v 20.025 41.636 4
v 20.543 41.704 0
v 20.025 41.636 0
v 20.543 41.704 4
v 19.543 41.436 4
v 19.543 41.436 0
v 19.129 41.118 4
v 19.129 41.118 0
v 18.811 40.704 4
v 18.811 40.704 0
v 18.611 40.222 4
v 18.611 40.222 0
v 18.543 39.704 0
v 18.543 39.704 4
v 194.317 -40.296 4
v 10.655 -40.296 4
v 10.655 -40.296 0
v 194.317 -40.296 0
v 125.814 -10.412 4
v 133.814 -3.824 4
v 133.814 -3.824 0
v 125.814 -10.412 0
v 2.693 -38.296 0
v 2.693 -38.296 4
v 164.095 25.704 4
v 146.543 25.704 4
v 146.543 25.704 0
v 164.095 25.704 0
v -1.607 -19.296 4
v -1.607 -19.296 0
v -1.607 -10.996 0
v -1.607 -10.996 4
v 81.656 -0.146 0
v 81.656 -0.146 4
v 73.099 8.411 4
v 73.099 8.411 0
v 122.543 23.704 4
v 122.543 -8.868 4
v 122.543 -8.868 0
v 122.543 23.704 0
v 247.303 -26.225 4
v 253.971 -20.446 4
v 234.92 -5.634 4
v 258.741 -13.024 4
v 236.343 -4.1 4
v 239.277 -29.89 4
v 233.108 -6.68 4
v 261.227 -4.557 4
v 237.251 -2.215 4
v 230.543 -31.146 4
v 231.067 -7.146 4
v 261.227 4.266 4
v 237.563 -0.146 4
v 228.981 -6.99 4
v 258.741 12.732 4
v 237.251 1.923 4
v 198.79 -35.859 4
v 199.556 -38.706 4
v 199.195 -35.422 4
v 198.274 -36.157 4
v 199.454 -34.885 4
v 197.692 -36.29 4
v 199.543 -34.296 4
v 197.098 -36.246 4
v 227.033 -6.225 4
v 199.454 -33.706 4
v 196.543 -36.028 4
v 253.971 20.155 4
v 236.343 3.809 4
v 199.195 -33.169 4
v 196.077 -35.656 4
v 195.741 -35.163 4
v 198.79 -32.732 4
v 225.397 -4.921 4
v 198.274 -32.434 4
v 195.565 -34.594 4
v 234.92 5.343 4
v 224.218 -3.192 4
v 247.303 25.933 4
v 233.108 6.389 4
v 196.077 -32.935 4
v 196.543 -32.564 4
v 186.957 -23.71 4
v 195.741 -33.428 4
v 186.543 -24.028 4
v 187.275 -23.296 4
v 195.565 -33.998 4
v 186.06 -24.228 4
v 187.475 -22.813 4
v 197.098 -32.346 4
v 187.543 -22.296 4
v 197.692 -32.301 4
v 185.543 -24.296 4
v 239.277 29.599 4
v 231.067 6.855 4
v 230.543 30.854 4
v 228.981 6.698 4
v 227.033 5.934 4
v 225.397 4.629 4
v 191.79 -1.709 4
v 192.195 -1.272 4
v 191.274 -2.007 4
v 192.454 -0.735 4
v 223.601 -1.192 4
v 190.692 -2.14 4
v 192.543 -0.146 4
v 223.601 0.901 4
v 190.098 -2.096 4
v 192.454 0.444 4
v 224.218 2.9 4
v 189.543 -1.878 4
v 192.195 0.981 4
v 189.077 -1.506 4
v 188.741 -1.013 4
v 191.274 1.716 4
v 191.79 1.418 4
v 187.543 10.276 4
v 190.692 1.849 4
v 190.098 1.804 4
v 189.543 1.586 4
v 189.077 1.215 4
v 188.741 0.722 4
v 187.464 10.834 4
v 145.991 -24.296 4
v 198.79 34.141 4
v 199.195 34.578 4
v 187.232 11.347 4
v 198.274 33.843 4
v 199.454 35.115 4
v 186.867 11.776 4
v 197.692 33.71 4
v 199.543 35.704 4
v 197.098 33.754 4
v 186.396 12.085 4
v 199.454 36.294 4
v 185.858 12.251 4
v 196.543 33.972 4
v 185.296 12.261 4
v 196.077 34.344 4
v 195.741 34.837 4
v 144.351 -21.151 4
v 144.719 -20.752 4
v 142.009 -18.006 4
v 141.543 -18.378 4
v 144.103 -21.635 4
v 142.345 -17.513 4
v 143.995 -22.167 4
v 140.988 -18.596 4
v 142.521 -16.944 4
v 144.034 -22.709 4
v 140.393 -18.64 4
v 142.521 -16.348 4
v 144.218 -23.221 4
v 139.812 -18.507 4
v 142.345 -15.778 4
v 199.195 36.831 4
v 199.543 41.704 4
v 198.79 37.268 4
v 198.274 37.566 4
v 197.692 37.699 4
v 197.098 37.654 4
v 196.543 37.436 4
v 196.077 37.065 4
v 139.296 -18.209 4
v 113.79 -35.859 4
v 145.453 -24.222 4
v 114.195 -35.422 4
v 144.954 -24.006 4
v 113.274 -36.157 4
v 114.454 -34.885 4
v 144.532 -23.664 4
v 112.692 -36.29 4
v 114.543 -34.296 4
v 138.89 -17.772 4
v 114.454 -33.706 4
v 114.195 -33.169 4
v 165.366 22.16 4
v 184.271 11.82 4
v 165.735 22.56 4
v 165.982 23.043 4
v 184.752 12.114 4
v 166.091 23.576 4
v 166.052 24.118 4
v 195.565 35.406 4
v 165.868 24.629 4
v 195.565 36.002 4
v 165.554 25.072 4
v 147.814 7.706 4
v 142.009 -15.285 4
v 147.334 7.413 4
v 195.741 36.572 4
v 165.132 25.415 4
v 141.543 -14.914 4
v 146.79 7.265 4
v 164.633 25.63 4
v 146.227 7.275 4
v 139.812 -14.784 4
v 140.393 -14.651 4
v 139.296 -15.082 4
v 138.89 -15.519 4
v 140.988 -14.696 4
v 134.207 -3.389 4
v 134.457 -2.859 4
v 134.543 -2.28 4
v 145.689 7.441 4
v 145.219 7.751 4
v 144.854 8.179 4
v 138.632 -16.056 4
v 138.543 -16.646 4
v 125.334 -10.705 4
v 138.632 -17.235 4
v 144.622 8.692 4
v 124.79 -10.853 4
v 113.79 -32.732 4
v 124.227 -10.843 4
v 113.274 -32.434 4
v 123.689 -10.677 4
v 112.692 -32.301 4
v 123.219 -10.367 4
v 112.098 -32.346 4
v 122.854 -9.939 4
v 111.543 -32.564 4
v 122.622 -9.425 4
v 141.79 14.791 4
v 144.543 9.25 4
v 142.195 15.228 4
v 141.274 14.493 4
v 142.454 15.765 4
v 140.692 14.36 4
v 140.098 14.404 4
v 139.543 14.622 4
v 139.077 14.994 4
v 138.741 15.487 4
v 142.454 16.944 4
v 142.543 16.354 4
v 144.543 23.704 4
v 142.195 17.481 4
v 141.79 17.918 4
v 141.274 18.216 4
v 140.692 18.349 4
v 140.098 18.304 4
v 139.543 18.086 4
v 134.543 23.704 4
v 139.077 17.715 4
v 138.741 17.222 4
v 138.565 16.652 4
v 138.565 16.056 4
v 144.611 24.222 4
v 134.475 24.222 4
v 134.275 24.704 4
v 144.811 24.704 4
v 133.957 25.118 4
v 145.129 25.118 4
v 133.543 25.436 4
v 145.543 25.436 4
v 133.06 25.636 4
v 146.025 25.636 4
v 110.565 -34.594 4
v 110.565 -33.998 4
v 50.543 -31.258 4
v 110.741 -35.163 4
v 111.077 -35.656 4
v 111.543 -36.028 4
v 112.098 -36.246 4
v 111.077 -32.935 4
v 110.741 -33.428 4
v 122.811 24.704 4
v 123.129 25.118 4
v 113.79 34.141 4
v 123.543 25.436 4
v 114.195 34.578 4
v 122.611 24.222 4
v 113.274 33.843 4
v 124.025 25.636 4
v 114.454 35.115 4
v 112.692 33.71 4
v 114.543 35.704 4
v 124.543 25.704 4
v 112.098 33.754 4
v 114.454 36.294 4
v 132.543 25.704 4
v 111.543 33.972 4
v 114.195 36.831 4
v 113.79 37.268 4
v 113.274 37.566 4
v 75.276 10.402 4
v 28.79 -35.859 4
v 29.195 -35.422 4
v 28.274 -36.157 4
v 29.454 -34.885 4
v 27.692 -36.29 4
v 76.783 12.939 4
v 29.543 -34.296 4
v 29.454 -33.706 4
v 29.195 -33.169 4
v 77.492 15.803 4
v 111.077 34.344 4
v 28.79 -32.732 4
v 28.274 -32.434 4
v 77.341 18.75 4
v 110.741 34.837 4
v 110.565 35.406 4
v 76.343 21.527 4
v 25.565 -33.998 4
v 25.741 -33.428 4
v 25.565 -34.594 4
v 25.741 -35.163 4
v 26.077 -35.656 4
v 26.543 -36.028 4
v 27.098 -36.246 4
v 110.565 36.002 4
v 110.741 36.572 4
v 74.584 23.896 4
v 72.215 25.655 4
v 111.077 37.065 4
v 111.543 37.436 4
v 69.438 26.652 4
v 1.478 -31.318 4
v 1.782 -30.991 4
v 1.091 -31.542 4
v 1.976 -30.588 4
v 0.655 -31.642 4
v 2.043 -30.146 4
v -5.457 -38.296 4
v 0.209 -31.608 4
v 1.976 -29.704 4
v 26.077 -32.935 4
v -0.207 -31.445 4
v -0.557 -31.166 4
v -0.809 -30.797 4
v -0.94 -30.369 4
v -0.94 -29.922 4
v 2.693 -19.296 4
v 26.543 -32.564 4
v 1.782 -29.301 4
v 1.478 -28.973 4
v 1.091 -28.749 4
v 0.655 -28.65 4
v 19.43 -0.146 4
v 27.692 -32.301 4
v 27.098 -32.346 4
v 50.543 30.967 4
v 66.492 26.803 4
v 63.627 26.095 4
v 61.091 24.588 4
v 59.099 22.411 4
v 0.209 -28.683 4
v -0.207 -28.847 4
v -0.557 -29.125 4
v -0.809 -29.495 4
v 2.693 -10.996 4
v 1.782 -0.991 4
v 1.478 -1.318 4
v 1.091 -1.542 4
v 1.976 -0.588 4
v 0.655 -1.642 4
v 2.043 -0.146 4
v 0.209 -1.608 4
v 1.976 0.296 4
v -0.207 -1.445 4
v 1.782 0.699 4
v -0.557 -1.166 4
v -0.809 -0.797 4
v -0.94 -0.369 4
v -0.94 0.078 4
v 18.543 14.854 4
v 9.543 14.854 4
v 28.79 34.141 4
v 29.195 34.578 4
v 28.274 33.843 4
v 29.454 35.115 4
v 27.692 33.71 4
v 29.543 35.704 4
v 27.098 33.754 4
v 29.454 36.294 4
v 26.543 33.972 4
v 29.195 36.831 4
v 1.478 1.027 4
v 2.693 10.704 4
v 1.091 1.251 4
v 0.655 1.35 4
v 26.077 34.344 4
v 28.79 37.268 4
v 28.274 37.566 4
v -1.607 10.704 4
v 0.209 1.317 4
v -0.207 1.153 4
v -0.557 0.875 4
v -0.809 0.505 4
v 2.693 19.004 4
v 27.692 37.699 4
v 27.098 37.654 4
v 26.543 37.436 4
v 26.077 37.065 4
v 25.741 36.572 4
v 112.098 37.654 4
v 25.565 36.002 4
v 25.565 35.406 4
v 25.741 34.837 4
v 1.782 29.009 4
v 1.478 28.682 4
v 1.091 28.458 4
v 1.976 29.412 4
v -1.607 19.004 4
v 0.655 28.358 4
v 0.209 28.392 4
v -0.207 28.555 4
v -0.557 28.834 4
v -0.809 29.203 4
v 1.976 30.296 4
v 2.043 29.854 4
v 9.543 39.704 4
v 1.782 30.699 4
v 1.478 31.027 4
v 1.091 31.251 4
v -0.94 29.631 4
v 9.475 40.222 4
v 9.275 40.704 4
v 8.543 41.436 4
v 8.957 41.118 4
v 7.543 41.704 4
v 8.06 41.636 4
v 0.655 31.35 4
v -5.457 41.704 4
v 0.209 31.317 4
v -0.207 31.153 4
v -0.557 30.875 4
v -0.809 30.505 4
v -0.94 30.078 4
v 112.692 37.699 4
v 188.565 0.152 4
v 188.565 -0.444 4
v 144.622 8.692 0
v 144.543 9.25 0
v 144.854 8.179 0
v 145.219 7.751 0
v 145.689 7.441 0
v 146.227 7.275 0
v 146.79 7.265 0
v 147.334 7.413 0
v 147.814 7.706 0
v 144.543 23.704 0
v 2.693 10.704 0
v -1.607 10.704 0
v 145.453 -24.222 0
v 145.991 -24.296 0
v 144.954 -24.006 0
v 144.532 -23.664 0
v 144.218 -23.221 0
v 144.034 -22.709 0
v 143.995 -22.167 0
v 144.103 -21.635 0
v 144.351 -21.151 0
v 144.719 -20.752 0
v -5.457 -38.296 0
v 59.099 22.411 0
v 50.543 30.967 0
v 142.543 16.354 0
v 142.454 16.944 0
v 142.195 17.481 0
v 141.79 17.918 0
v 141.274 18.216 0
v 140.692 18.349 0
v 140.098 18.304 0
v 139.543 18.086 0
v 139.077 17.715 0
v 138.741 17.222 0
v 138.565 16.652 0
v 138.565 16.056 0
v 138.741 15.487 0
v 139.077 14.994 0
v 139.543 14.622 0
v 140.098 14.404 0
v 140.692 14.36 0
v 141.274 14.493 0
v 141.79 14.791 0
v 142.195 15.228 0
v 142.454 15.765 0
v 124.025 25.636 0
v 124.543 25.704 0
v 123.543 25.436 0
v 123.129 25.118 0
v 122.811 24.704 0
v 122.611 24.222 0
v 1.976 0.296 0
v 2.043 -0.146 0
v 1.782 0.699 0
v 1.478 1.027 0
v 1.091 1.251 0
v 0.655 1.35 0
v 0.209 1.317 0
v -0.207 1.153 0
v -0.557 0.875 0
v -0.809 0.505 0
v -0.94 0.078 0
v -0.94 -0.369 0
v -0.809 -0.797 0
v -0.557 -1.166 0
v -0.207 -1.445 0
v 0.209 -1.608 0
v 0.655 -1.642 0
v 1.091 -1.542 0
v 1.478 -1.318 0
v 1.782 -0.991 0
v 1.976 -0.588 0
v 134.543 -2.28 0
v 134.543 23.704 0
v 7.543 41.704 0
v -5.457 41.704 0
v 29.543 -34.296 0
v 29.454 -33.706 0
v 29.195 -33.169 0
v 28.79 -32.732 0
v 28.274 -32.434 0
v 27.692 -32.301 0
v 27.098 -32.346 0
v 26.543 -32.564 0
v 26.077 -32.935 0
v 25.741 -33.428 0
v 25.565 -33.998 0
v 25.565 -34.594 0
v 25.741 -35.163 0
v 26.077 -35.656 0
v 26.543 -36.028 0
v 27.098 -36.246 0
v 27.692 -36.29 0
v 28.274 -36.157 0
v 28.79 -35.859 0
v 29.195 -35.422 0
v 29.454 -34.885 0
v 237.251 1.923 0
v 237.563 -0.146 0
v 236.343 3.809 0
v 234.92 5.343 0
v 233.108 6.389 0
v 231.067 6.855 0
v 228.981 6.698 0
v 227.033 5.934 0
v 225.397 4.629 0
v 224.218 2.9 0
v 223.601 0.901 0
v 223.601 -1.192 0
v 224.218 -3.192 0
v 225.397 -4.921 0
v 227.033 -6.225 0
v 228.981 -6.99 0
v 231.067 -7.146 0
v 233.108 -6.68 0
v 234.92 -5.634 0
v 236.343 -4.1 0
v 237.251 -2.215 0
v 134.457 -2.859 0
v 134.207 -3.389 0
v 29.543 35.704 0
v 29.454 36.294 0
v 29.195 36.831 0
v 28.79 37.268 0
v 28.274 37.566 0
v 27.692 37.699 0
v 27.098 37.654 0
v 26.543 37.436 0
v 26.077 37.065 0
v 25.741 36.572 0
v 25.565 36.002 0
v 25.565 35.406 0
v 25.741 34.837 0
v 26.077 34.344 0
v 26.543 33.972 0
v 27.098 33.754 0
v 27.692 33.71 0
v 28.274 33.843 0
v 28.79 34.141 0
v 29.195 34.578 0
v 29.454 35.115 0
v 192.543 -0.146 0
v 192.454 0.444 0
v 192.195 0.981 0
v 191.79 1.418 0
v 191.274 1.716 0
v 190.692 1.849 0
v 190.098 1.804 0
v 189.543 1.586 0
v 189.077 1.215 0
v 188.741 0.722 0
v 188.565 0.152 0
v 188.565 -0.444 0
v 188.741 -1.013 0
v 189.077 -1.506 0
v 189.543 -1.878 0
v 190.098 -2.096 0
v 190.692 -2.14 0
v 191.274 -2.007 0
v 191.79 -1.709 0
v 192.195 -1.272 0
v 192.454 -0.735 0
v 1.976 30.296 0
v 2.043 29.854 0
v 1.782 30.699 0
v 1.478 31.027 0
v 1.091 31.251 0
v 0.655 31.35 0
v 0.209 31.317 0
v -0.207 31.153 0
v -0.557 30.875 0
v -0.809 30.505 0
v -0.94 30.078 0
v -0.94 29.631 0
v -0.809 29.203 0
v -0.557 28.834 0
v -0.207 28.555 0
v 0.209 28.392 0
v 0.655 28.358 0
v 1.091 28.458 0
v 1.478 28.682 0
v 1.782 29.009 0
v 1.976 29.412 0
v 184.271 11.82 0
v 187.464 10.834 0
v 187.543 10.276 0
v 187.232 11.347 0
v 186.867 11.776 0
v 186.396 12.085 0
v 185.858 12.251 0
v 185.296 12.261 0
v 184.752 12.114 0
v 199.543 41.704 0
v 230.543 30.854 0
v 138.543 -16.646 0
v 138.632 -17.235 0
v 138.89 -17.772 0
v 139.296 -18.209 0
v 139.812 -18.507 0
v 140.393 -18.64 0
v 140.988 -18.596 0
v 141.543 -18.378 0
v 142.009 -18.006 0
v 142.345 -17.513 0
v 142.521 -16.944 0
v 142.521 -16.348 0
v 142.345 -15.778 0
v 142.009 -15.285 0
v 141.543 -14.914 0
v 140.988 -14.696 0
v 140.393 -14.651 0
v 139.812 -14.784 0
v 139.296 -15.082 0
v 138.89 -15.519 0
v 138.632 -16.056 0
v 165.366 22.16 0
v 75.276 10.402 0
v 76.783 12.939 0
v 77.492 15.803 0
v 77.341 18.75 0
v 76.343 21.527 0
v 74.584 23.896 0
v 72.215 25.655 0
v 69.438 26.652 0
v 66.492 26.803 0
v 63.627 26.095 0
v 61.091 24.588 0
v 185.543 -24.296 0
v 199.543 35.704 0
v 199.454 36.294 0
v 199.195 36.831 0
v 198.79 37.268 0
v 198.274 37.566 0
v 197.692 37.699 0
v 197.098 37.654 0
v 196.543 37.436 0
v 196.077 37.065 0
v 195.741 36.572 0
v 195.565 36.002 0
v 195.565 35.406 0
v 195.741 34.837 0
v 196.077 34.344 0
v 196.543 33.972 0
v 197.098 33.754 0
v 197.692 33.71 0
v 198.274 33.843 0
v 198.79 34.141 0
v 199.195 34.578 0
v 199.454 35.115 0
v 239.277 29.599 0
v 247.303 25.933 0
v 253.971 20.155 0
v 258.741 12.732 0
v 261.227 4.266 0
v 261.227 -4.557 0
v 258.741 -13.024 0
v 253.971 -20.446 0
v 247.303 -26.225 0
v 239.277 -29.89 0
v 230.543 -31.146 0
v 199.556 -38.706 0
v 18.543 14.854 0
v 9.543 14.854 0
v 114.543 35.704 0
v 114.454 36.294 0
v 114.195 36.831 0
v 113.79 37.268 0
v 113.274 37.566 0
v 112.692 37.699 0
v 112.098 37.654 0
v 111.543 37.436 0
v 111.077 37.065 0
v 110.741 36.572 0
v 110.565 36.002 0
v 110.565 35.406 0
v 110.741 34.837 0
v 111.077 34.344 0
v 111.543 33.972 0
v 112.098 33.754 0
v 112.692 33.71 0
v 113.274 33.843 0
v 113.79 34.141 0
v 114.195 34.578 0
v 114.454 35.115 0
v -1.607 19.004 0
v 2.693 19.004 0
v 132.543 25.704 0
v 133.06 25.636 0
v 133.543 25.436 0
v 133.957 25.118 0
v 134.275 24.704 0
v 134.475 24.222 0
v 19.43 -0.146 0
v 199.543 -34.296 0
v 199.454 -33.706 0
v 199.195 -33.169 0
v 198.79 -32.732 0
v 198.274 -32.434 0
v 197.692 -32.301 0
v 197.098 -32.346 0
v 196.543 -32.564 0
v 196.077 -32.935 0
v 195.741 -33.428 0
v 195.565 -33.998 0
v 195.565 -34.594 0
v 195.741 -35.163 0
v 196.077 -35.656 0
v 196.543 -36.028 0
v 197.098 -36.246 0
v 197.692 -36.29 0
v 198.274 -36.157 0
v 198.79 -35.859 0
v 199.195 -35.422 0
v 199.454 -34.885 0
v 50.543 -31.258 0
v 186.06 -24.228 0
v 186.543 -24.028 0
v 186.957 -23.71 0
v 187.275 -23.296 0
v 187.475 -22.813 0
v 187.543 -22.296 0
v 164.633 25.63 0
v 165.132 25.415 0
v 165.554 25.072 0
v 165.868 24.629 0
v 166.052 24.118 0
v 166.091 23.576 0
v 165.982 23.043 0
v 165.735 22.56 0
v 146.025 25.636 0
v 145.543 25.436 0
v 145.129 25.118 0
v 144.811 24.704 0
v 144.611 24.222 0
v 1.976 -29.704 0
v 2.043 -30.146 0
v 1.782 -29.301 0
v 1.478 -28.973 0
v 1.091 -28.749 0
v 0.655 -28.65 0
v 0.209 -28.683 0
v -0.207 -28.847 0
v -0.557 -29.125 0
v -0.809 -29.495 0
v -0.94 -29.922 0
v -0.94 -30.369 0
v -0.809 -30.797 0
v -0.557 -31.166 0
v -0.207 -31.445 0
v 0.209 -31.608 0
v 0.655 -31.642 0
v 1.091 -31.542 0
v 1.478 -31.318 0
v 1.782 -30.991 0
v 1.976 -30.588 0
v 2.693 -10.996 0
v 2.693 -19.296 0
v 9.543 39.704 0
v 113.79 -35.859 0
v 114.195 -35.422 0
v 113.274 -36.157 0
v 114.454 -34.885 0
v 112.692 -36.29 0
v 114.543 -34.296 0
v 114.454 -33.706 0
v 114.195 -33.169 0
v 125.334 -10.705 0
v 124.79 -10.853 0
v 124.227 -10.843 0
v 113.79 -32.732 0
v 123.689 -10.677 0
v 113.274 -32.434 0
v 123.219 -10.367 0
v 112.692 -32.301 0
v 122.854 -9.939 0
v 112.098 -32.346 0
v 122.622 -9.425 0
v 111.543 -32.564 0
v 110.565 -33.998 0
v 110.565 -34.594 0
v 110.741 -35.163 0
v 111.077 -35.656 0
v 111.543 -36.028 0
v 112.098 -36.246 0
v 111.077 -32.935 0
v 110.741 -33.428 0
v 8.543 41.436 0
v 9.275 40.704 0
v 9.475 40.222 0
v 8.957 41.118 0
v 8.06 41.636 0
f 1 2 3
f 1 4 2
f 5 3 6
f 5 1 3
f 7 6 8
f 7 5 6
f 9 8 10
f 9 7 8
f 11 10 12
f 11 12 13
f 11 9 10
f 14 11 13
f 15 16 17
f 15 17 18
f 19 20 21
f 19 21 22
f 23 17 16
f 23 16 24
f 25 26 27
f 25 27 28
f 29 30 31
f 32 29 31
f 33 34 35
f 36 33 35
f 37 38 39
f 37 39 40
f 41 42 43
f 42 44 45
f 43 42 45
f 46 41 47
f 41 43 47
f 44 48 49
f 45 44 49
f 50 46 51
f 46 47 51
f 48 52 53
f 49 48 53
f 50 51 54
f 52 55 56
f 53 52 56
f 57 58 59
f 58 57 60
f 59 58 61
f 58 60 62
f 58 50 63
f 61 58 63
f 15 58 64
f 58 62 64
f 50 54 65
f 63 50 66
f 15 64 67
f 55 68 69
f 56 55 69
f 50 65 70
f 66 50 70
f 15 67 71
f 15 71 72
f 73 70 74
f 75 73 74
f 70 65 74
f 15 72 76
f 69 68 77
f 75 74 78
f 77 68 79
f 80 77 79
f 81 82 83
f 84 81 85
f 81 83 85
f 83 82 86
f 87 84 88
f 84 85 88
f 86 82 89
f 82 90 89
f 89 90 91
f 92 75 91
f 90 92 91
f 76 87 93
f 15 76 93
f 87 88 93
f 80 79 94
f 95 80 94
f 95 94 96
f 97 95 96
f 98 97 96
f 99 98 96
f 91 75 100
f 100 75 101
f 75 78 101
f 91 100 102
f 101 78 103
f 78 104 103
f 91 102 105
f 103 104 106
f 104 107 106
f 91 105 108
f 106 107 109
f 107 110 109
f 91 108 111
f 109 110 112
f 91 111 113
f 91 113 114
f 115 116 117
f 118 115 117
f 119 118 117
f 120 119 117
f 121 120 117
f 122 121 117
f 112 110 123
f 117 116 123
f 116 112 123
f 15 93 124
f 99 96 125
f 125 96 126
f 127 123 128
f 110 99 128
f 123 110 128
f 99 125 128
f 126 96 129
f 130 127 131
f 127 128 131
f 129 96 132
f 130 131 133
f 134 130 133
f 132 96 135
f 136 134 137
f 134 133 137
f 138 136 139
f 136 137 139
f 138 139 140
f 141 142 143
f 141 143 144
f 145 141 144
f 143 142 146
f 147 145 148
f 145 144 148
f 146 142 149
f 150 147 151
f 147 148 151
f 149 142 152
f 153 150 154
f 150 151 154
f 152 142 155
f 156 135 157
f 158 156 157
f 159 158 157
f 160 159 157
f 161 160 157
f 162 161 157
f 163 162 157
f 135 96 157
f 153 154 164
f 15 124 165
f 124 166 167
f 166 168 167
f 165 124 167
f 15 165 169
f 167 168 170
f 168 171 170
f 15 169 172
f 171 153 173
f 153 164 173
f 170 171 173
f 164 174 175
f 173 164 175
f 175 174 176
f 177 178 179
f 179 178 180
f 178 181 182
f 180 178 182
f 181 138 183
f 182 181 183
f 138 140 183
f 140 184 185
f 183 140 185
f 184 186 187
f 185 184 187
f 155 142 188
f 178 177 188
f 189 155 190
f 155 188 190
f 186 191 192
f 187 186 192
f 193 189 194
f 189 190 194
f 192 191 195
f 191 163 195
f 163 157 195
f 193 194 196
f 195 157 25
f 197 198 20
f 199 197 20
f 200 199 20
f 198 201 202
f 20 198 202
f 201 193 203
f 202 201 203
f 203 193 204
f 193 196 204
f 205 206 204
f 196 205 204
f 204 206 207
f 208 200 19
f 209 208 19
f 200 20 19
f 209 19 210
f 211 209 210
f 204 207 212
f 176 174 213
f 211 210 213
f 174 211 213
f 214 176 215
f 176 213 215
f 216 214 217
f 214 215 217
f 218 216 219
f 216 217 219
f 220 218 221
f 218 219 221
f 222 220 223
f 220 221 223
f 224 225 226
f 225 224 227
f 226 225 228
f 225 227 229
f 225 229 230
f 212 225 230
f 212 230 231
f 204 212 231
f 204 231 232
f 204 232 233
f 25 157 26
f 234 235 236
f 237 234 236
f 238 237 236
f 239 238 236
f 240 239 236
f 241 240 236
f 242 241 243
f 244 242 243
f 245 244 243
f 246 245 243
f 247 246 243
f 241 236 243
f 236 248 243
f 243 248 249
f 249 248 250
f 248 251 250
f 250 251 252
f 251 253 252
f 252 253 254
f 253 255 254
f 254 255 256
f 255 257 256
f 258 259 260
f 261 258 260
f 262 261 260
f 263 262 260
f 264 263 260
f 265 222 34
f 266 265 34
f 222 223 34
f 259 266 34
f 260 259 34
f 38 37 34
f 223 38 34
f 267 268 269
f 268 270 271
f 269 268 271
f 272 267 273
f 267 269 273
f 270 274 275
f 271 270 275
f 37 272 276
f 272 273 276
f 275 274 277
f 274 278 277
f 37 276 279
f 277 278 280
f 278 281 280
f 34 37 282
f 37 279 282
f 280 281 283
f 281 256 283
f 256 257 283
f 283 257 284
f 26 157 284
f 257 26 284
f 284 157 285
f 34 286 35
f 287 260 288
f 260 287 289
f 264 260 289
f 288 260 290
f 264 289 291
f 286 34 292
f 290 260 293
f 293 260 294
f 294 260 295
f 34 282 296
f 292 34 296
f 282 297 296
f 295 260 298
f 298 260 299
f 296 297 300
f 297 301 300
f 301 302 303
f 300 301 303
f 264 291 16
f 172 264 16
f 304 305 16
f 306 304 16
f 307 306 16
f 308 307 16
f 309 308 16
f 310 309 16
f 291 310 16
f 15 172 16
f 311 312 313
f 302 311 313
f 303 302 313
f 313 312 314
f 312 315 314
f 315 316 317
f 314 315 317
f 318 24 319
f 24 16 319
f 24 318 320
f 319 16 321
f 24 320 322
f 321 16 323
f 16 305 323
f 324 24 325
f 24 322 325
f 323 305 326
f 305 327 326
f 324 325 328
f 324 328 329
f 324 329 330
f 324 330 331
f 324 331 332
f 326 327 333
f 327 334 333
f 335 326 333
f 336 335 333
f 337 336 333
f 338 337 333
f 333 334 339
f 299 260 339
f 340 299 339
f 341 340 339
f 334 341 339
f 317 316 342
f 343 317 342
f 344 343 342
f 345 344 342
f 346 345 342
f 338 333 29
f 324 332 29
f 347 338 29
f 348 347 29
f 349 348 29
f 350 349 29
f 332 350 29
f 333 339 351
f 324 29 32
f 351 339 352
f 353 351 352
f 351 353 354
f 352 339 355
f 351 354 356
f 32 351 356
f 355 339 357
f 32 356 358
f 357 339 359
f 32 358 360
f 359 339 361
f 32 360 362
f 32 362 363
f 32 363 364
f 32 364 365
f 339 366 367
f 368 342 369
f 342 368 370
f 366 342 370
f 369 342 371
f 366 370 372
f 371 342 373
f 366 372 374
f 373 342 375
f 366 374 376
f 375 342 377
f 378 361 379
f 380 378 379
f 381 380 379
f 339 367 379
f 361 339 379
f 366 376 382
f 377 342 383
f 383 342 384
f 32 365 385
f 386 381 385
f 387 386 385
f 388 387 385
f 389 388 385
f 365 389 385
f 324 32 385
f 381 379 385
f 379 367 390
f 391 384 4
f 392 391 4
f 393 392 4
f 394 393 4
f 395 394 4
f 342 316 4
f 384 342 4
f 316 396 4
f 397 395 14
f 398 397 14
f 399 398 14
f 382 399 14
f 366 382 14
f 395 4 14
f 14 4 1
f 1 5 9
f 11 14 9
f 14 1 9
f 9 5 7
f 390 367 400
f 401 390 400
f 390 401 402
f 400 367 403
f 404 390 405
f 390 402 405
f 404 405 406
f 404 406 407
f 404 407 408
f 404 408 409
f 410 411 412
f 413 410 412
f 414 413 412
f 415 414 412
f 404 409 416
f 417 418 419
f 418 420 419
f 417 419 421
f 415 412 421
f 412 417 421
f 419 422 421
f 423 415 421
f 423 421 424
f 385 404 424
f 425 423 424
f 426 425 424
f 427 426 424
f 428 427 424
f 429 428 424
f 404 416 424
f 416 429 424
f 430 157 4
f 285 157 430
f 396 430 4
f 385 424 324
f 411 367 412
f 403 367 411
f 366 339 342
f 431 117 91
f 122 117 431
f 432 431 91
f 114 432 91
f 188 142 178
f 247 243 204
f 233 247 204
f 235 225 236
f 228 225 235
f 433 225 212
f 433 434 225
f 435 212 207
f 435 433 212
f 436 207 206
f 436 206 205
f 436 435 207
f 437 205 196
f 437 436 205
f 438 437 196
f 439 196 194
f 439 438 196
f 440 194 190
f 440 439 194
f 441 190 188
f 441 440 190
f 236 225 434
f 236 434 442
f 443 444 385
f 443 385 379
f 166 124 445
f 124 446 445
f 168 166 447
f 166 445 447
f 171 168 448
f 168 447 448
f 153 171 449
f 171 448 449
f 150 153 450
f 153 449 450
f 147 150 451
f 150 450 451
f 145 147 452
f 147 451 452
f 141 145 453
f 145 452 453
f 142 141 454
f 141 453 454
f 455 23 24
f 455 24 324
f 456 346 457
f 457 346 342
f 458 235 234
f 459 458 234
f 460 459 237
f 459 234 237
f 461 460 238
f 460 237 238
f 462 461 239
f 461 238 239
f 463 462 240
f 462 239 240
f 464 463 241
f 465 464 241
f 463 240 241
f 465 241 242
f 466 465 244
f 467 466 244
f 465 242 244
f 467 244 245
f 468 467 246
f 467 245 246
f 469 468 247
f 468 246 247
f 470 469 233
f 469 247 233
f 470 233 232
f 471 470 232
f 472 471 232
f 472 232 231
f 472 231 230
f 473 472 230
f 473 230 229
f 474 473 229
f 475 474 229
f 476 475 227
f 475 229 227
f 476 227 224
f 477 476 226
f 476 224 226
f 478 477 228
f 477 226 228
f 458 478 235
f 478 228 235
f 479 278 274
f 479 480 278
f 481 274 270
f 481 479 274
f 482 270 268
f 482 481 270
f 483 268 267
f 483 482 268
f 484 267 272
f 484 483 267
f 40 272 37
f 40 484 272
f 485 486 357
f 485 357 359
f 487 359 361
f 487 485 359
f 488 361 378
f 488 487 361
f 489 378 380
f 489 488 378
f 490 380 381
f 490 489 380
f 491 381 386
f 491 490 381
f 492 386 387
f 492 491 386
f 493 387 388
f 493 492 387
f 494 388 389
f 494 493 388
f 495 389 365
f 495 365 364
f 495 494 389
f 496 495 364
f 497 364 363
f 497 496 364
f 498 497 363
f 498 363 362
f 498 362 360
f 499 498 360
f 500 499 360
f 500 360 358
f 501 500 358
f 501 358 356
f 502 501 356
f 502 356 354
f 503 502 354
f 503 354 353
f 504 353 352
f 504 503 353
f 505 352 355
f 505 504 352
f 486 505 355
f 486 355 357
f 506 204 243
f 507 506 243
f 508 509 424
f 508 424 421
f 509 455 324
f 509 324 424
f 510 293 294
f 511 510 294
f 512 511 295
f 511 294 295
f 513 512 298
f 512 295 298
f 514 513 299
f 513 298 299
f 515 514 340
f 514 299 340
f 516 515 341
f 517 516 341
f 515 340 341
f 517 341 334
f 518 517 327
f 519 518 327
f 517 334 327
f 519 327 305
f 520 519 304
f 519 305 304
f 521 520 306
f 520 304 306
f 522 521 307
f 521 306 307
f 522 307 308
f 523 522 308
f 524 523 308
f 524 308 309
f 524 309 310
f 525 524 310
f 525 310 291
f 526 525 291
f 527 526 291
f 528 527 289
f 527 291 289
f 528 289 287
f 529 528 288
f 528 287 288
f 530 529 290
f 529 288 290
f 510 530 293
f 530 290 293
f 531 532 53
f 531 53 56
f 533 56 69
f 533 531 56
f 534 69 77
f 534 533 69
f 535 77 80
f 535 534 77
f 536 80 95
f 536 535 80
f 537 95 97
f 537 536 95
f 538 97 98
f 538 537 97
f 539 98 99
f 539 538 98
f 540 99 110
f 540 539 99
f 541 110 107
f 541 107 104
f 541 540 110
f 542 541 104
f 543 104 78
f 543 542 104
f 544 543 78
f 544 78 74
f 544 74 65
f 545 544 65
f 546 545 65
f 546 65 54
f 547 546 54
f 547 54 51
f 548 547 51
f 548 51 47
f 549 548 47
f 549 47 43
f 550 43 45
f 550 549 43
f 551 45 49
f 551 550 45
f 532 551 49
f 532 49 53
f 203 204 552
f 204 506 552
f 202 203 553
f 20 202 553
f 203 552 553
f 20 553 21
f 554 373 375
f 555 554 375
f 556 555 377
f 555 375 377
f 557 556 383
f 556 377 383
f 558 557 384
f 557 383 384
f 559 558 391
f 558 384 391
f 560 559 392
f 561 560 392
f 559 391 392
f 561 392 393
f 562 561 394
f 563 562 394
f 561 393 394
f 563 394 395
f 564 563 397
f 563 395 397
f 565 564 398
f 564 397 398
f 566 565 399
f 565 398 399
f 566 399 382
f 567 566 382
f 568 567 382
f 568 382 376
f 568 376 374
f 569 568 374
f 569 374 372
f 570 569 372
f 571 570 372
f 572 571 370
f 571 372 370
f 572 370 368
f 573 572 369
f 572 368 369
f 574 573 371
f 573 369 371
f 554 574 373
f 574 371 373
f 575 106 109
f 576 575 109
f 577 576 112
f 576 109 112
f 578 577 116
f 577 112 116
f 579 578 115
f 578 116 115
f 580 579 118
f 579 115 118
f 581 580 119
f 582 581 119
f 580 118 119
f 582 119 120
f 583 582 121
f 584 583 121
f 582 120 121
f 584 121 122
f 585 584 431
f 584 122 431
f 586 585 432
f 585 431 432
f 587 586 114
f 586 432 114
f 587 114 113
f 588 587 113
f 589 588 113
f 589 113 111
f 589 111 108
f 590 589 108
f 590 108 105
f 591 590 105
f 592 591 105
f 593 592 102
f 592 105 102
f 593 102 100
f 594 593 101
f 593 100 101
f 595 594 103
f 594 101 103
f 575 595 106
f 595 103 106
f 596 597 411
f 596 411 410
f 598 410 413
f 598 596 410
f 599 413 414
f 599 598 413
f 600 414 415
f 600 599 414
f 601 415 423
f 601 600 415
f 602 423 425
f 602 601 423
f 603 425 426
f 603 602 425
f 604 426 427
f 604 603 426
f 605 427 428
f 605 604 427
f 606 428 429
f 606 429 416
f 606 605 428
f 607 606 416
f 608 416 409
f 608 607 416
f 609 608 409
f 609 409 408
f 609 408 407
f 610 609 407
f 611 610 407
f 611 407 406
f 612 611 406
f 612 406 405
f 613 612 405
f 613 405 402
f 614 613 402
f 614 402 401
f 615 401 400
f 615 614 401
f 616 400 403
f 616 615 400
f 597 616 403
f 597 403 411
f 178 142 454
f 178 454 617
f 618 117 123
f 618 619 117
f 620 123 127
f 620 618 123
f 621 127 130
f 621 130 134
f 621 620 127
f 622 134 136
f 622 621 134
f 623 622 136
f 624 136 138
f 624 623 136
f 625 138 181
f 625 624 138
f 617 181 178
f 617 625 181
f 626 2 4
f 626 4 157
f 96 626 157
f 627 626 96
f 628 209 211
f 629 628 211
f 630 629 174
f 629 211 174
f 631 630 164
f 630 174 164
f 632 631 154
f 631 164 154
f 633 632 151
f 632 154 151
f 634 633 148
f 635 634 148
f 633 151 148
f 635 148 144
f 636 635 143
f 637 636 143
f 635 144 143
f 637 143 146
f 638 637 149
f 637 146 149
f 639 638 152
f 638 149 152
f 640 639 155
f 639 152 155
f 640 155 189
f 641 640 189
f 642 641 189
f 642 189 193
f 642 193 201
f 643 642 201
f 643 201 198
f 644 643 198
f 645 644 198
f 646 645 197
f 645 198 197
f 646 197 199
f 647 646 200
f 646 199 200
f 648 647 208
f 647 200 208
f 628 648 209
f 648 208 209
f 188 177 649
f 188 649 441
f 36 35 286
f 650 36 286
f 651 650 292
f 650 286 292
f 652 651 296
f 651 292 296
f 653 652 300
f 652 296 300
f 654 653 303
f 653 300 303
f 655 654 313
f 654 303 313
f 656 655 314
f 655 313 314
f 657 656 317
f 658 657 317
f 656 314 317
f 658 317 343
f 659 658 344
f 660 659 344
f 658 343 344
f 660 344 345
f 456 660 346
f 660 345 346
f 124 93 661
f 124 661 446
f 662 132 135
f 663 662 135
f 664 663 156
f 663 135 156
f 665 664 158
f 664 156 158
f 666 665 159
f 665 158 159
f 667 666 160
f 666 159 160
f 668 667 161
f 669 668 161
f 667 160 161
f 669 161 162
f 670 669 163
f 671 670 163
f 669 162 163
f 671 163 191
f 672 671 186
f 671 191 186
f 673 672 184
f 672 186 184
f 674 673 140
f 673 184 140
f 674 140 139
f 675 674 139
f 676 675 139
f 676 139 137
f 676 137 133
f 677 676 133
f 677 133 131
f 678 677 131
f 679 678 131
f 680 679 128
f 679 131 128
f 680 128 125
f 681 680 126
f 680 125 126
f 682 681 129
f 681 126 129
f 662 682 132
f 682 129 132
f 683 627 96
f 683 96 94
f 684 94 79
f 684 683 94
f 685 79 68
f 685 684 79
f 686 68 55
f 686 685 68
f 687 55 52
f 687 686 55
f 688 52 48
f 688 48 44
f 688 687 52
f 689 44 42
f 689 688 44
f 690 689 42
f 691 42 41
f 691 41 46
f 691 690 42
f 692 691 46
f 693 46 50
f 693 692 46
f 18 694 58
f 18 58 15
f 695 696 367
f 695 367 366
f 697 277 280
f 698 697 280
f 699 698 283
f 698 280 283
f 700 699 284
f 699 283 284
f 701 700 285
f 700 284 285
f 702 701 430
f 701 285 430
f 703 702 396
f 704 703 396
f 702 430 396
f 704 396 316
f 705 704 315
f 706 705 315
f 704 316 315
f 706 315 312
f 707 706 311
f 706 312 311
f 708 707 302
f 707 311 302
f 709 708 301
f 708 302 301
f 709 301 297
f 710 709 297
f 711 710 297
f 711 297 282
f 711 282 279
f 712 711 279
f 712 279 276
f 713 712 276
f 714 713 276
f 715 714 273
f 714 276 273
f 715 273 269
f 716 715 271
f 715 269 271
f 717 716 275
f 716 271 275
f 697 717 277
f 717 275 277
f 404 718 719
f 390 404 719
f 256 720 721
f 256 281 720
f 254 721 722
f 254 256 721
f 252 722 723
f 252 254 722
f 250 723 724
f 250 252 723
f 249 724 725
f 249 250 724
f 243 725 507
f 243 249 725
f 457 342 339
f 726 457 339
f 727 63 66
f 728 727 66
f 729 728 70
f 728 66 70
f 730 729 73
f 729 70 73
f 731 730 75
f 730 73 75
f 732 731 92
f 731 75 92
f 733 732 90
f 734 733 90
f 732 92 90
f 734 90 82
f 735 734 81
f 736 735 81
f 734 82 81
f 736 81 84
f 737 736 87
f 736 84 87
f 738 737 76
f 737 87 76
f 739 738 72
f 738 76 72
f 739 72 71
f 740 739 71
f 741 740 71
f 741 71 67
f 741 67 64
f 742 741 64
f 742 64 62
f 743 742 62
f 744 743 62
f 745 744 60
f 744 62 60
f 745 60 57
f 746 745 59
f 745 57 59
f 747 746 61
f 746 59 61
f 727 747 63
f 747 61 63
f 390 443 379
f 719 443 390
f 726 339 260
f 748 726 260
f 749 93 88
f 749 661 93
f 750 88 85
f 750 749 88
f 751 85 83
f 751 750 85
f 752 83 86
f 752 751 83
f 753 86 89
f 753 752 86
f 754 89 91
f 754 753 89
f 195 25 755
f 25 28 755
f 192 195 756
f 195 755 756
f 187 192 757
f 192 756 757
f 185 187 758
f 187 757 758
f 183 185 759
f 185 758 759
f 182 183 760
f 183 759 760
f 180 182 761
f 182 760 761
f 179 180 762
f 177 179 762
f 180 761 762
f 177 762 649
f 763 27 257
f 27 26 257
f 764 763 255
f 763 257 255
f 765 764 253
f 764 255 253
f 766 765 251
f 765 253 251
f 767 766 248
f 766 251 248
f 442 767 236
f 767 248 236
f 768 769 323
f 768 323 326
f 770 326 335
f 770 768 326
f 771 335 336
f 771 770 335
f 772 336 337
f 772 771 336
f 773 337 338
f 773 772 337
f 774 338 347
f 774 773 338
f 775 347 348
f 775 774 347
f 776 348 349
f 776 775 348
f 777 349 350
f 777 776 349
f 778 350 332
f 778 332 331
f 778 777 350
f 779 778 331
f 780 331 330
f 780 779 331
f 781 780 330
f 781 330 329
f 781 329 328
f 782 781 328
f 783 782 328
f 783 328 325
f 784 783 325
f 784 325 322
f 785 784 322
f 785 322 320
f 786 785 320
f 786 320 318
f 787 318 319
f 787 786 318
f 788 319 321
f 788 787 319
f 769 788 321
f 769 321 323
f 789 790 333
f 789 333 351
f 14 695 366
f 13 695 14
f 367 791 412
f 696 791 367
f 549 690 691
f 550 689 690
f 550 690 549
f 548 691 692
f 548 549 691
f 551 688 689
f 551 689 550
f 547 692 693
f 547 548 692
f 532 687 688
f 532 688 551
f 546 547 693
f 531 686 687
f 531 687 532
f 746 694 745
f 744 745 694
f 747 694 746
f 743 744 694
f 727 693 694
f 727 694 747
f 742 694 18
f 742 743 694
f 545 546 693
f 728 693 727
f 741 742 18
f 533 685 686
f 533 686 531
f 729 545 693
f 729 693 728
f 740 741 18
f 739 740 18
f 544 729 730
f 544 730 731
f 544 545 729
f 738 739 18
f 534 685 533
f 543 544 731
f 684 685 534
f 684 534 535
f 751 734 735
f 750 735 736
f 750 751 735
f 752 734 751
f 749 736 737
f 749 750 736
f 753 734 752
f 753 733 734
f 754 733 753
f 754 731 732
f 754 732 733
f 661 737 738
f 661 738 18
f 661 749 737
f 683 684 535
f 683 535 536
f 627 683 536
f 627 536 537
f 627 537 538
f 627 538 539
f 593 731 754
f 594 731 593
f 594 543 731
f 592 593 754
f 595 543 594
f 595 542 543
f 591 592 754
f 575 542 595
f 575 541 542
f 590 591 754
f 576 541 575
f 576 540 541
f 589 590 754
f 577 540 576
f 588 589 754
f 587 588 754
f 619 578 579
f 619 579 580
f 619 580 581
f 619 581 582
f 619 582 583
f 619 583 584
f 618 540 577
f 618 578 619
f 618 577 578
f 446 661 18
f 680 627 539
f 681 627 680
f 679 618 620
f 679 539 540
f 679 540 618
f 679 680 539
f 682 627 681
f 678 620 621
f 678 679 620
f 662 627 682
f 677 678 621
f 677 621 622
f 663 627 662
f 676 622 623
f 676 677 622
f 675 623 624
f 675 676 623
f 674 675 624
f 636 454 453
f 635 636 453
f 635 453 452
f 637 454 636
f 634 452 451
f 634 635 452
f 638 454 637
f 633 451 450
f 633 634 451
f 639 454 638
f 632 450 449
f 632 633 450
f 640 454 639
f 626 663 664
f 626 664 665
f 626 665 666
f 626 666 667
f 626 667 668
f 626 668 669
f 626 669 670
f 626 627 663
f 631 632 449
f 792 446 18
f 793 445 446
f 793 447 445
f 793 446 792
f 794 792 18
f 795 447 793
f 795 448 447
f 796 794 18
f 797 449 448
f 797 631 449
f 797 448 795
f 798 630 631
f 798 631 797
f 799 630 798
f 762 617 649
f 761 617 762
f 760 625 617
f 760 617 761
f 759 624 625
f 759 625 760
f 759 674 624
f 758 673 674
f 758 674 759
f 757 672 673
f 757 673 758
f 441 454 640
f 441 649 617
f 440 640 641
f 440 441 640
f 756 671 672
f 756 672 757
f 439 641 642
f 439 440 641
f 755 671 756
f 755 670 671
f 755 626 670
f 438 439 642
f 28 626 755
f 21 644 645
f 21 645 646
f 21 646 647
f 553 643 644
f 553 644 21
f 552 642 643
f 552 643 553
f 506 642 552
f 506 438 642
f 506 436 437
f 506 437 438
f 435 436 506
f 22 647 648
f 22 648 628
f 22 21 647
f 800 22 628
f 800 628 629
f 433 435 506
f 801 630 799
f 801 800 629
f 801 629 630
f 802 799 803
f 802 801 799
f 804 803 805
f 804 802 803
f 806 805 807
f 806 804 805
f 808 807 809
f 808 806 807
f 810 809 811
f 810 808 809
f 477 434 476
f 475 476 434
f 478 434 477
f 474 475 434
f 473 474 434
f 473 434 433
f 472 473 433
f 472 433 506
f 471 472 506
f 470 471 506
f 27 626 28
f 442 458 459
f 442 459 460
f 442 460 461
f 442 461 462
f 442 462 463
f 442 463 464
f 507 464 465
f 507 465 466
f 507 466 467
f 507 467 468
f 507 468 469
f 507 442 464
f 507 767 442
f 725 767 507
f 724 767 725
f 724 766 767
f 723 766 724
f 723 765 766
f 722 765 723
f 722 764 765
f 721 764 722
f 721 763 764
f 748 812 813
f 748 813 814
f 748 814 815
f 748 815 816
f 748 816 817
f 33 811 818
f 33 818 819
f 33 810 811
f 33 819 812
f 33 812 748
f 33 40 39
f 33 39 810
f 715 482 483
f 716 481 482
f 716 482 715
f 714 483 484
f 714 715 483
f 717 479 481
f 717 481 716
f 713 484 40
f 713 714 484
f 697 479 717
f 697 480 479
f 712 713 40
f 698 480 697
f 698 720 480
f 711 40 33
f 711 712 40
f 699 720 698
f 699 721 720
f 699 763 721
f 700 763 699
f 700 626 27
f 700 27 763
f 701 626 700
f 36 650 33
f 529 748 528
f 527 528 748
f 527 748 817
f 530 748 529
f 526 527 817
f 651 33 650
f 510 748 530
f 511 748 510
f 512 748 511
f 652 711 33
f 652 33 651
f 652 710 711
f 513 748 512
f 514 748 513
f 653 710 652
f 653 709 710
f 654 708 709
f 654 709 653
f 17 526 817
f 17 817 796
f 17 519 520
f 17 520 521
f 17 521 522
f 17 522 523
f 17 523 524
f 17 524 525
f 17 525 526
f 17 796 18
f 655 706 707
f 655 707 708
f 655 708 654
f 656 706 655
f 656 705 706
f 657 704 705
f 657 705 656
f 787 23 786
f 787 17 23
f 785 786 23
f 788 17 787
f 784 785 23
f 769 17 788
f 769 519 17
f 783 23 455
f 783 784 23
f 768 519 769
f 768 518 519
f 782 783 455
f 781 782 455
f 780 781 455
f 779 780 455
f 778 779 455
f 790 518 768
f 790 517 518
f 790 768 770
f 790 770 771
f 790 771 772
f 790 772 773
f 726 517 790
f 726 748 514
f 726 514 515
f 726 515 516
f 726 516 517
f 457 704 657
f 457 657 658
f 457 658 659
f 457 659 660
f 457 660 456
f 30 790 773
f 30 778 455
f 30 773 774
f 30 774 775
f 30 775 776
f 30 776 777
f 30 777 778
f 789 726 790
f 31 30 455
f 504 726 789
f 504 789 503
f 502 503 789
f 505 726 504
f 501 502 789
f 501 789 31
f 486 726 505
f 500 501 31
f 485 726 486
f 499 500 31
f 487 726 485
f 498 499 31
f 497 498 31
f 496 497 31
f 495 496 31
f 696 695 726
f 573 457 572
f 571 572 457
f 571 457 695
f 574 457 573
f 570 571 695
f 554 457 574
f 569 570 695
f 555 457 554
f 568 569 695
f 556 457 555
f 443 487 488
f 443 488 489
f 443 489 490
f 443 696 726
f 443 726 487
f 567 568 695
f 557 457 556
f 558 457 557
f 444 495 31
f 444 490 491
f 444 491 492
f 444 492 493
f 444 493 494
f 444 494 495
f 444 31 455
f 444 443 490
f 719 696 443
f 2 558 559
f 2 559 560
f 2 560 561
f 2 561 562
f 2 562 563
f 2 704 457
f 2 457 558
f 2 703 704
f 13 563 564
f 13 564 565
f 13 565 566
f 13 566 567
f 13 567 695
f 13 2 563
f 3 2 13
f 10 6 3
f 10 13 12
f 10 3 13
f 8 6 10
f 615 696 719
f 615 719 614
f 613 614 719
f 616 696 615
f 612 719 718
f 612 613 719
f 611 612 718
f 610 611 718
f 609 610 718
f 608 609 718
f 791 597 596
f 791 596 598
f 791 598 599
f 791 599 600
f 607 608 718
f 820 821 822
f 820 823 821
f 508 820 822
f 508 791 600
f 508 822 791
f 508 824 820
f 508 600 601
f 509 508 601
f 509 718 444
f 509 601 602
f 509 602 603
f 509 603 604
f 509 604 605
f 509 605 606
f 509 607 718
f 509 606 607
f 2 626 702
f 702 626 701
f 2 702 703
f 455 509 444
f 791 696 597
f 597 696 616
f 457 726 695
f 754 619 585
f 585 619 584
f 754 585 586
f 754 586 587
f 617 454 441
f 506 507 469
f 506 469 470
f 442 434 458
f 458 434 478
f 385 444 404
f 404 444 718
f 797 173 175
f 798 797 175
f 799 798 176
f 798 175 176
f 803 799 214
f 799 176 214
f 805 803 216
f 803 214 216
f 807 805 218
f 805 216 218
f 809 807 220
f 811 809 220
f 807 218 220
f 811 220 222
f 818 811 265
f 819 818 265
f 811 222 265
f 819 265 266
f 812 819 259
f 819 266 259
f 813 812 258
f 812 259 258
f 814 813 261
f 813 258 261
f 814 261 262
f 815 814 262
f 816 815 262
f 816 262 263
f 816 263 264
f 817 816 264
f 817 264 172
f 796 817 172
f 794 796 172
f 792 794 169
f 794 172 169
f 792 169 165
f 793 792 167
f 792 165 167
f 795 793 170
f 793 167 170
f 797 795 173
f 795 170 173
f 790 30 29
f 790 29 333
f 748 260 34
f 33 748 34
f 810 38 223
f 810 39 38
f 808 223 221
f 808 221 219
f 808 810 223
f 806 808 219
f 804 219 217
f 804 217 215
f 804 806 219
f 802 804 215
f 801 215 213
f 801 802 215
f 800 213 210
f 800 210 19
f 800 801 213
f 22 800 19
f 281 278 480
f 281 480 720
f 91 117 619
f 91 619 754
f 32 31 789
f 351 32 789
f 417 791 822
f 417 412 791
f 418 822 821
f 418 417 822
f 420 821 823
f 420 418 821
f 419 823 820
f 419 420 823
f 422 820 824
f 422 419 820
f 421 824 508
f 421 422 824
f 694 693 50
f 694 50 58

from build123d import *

# Parameters (mm, degrees)
SKETCH_1_R          = 1.5
SKETCH_1_R_2        = 7.02
SKETCH_1_W          = 4.3
SKETCH_1_H          = 8.3
EXTRUDE_1_DEPTH     = 4
CUT_EXTRUDE_1_DEPTH = 4
SKETCH_3_R          = 2
CUT_EXTRUDE_2_DEPTH = 4
SKETCH_4_W          = 10
SKETCH_4_H          = 47.093490756
EXTRUDE_2_DEPTH     = 4
SKETCH_7_R          = 2
CUT_EXTRUDE_3_DEPTH = 4
FILLET_1_R          = 2


with BuildPart() as part:
    # 草图1 → 凸台-拉伸1 (new body)
    with BuildSketch(Plane.XY):
        with BuildLine():
            Line((230.542857143, -31.145714286), (199.556073527, -38.70591431))
            Line((199.556073527, -38.70591431), (174.542857143, -46.295714286))
            Line((174.542857143, -46.295714286), (34.542857143, -46.295714286))
            Line((34.542857143, -46.295714286), (2.692857143, -38.295714286))
            Line((2.692857143, -38.295714286), (-5.457142857, -38.295714286))
            Line((-5.457142857, -38.295714286), (-5.457142857, 41.704285714))
            Line((-5.457142857, 41.704285714), (9.542857143, 41.704285714))
            Line((9.542857143, 41.704285714), (9.542857143, 14.854285714))
            Line((9.542857143, 14.854285714), (18.542857143, 14.854285714))
            Line((18.542857143, 14.854285714), (18.542857143, 41.704285714))
            Line((18.542857143, 41.704285714), (199.542857143, 41.704285714))
            Line((199.542857143, 41.704285714), (230.542857143, 30.854285714))
            ThreePointArc((230.542857143, 30.854285714), (261.542857143, -0.145714286), (230.542857143, -31.145714286))
        make_face()
        with Locations((0.542857143, 29.854285714)):
            Circle(SKETCH_1_R, mode=Mode.SUBTRACT)
        with Locations((0.542857143, -0.145714286)):
            Circle(SKETCH_1_R, mode=Mode.SUBTRACT)
        with Locations((0.542857143, -30.145714286)):
            Circle(SKETCH_1_R, mode=Mode.SUBTRACT)
        with Locations((230.542857143, -0.145714286)):
            Circle(SKETCH_1_R_2, mode=Mode.SUBTRACT)
        with Locations((0.542857143, 14.854285714)):
            Rectangle(SKETCH_1_W, SKETCH_1_H, mode=Mode.SUBTRACT)
        with Locations((0.542857143, -15.145714286)):
            Rectangle(SKETCH_1_W, SKETCH_1_H, mode=Mode.SUBTRACT)
    extrude(amount=EXTRUDE_1_DEPTH)

    # 草图2 → 切除-拉伸1 (cut)
    with BuildSketch(Plane.XY.offset(4)):
        with BuildLine():
            Line((59.099206329, 22.4106349), (50.542857143, 30.966984086))
            Line((50.542857143, 30.966984086), (19.430158771, -0.145714286))
            Line((19.430158771, -0.145714286), (50.542857143, -31.258412658))
            Line((50.542857143, -31.258412658), (81.655555515, -0.145714286))
            Line((81.655555515, -0.145714286), (73.099206329, 8.4106349))
            ThreePointArc((73.099206329, 8.4106349), (74.584487703, 23.895916275), (59.099206329, 22.4106349))
        make_face()
    extrude(amount=-CUT_EXTRUDE_1_DEPTH, mode=Mode.SUBTRACT)

    # 草图3 → 切除-拉伸2 (cut)
    with BuildSketch(Plane.XY.offset(4)):
        with Locations((27.542857143, 35.704285714)):
            Circle(SKETCH_3_R)
        with Locations((112.542857143, 35.704285714)):
            Circle(SKETCH_3_R)
        with Locations((197.542857143, 35.704285714)):
            Circle(SKETCH_3_R)
        with Locations((112.542857143, -34.295714286)):
            Circle(SKETCH_3_R)
        with Locations((197.542857143, -34.295714286)):
            Circle(SKETCH_3_R)
        with Locations((27.542857143, -34.295714286)):
            Circle(SKETCH_3_R)
        Polygon((187.542857143, -24.295714286), (140.41622539, -24.295714286), (187.542857143, 14.51445304), align=None)
        Polygon((122.542857143, 25.704285714), (169.669488896, 25.704285714), (122.542857143, -13.105881612), align=None)
    extrude(amount=-CUT_EXTRUDE_2_DEPTH, mode=Mode.SUBTRACT)

    # 草图4 → 凸台-拉伸2 (add)
    with BuildSketch(Plane.XY.offset(4)):
        with Locations((139.542857143, 15.704285714)):
            Rectangle(SKETCH_4_W, SKETCH_4_H)
    extrude(amount=-EXTRUDE_2_DEPTH)

    # 草图7 → 切除-拉伸3 (cut)
    with BuildSketch(Plane.XY.offset(4)):
        with Locations((190.542857143, -0.145714286)):
            Circle(SKETCH_7_R)
        with Locations((140.542857143, 16.354285714)):
            Circle(SKETCH_7_R)
        with Locations(Location((140.542857143, -16.645714286, 0), (0, 0, 180))):
            Circle(SKETCH_7_R)
        Polygon((10.655357143, -40.295714286), (194.316671838, -40.295714286), (206.19710926, -67.618852766), (10.655357143, -65.874099546), align=None)
    extrude(amount=-CUT_EXTRUDE_3_DEPTH, mode=Mode.SUBTRACT)

    # 圆角1
    fillet_1_edges = [part.edges().sort_by_distance(p)[0] for p in [
        (187.542857143, 14.51445304, 2),
        (187.542857143, -24.295714286, 2),
        (140.41622539, -24.295714286, 2),
        (122.542857143, -13.105881612, 2),
        (122.542857143, 25.704285714, 2),
        (169.669488896, 25.704285714, 2),
        (134.542857143, -3.223528671, 2),
        (144.542857143, 5.011765447, 2),
        (144.542857143, 25.704285714, 2),
        (134.542857143, 25.704285714, 2),
        (9.542857143, 41.704285714, 2),
        (18.542857143, 41.704285714, 2),
    ]]
    fillet(fillet_1_edges, radius=FILLET_1_R)


solid = part.part
